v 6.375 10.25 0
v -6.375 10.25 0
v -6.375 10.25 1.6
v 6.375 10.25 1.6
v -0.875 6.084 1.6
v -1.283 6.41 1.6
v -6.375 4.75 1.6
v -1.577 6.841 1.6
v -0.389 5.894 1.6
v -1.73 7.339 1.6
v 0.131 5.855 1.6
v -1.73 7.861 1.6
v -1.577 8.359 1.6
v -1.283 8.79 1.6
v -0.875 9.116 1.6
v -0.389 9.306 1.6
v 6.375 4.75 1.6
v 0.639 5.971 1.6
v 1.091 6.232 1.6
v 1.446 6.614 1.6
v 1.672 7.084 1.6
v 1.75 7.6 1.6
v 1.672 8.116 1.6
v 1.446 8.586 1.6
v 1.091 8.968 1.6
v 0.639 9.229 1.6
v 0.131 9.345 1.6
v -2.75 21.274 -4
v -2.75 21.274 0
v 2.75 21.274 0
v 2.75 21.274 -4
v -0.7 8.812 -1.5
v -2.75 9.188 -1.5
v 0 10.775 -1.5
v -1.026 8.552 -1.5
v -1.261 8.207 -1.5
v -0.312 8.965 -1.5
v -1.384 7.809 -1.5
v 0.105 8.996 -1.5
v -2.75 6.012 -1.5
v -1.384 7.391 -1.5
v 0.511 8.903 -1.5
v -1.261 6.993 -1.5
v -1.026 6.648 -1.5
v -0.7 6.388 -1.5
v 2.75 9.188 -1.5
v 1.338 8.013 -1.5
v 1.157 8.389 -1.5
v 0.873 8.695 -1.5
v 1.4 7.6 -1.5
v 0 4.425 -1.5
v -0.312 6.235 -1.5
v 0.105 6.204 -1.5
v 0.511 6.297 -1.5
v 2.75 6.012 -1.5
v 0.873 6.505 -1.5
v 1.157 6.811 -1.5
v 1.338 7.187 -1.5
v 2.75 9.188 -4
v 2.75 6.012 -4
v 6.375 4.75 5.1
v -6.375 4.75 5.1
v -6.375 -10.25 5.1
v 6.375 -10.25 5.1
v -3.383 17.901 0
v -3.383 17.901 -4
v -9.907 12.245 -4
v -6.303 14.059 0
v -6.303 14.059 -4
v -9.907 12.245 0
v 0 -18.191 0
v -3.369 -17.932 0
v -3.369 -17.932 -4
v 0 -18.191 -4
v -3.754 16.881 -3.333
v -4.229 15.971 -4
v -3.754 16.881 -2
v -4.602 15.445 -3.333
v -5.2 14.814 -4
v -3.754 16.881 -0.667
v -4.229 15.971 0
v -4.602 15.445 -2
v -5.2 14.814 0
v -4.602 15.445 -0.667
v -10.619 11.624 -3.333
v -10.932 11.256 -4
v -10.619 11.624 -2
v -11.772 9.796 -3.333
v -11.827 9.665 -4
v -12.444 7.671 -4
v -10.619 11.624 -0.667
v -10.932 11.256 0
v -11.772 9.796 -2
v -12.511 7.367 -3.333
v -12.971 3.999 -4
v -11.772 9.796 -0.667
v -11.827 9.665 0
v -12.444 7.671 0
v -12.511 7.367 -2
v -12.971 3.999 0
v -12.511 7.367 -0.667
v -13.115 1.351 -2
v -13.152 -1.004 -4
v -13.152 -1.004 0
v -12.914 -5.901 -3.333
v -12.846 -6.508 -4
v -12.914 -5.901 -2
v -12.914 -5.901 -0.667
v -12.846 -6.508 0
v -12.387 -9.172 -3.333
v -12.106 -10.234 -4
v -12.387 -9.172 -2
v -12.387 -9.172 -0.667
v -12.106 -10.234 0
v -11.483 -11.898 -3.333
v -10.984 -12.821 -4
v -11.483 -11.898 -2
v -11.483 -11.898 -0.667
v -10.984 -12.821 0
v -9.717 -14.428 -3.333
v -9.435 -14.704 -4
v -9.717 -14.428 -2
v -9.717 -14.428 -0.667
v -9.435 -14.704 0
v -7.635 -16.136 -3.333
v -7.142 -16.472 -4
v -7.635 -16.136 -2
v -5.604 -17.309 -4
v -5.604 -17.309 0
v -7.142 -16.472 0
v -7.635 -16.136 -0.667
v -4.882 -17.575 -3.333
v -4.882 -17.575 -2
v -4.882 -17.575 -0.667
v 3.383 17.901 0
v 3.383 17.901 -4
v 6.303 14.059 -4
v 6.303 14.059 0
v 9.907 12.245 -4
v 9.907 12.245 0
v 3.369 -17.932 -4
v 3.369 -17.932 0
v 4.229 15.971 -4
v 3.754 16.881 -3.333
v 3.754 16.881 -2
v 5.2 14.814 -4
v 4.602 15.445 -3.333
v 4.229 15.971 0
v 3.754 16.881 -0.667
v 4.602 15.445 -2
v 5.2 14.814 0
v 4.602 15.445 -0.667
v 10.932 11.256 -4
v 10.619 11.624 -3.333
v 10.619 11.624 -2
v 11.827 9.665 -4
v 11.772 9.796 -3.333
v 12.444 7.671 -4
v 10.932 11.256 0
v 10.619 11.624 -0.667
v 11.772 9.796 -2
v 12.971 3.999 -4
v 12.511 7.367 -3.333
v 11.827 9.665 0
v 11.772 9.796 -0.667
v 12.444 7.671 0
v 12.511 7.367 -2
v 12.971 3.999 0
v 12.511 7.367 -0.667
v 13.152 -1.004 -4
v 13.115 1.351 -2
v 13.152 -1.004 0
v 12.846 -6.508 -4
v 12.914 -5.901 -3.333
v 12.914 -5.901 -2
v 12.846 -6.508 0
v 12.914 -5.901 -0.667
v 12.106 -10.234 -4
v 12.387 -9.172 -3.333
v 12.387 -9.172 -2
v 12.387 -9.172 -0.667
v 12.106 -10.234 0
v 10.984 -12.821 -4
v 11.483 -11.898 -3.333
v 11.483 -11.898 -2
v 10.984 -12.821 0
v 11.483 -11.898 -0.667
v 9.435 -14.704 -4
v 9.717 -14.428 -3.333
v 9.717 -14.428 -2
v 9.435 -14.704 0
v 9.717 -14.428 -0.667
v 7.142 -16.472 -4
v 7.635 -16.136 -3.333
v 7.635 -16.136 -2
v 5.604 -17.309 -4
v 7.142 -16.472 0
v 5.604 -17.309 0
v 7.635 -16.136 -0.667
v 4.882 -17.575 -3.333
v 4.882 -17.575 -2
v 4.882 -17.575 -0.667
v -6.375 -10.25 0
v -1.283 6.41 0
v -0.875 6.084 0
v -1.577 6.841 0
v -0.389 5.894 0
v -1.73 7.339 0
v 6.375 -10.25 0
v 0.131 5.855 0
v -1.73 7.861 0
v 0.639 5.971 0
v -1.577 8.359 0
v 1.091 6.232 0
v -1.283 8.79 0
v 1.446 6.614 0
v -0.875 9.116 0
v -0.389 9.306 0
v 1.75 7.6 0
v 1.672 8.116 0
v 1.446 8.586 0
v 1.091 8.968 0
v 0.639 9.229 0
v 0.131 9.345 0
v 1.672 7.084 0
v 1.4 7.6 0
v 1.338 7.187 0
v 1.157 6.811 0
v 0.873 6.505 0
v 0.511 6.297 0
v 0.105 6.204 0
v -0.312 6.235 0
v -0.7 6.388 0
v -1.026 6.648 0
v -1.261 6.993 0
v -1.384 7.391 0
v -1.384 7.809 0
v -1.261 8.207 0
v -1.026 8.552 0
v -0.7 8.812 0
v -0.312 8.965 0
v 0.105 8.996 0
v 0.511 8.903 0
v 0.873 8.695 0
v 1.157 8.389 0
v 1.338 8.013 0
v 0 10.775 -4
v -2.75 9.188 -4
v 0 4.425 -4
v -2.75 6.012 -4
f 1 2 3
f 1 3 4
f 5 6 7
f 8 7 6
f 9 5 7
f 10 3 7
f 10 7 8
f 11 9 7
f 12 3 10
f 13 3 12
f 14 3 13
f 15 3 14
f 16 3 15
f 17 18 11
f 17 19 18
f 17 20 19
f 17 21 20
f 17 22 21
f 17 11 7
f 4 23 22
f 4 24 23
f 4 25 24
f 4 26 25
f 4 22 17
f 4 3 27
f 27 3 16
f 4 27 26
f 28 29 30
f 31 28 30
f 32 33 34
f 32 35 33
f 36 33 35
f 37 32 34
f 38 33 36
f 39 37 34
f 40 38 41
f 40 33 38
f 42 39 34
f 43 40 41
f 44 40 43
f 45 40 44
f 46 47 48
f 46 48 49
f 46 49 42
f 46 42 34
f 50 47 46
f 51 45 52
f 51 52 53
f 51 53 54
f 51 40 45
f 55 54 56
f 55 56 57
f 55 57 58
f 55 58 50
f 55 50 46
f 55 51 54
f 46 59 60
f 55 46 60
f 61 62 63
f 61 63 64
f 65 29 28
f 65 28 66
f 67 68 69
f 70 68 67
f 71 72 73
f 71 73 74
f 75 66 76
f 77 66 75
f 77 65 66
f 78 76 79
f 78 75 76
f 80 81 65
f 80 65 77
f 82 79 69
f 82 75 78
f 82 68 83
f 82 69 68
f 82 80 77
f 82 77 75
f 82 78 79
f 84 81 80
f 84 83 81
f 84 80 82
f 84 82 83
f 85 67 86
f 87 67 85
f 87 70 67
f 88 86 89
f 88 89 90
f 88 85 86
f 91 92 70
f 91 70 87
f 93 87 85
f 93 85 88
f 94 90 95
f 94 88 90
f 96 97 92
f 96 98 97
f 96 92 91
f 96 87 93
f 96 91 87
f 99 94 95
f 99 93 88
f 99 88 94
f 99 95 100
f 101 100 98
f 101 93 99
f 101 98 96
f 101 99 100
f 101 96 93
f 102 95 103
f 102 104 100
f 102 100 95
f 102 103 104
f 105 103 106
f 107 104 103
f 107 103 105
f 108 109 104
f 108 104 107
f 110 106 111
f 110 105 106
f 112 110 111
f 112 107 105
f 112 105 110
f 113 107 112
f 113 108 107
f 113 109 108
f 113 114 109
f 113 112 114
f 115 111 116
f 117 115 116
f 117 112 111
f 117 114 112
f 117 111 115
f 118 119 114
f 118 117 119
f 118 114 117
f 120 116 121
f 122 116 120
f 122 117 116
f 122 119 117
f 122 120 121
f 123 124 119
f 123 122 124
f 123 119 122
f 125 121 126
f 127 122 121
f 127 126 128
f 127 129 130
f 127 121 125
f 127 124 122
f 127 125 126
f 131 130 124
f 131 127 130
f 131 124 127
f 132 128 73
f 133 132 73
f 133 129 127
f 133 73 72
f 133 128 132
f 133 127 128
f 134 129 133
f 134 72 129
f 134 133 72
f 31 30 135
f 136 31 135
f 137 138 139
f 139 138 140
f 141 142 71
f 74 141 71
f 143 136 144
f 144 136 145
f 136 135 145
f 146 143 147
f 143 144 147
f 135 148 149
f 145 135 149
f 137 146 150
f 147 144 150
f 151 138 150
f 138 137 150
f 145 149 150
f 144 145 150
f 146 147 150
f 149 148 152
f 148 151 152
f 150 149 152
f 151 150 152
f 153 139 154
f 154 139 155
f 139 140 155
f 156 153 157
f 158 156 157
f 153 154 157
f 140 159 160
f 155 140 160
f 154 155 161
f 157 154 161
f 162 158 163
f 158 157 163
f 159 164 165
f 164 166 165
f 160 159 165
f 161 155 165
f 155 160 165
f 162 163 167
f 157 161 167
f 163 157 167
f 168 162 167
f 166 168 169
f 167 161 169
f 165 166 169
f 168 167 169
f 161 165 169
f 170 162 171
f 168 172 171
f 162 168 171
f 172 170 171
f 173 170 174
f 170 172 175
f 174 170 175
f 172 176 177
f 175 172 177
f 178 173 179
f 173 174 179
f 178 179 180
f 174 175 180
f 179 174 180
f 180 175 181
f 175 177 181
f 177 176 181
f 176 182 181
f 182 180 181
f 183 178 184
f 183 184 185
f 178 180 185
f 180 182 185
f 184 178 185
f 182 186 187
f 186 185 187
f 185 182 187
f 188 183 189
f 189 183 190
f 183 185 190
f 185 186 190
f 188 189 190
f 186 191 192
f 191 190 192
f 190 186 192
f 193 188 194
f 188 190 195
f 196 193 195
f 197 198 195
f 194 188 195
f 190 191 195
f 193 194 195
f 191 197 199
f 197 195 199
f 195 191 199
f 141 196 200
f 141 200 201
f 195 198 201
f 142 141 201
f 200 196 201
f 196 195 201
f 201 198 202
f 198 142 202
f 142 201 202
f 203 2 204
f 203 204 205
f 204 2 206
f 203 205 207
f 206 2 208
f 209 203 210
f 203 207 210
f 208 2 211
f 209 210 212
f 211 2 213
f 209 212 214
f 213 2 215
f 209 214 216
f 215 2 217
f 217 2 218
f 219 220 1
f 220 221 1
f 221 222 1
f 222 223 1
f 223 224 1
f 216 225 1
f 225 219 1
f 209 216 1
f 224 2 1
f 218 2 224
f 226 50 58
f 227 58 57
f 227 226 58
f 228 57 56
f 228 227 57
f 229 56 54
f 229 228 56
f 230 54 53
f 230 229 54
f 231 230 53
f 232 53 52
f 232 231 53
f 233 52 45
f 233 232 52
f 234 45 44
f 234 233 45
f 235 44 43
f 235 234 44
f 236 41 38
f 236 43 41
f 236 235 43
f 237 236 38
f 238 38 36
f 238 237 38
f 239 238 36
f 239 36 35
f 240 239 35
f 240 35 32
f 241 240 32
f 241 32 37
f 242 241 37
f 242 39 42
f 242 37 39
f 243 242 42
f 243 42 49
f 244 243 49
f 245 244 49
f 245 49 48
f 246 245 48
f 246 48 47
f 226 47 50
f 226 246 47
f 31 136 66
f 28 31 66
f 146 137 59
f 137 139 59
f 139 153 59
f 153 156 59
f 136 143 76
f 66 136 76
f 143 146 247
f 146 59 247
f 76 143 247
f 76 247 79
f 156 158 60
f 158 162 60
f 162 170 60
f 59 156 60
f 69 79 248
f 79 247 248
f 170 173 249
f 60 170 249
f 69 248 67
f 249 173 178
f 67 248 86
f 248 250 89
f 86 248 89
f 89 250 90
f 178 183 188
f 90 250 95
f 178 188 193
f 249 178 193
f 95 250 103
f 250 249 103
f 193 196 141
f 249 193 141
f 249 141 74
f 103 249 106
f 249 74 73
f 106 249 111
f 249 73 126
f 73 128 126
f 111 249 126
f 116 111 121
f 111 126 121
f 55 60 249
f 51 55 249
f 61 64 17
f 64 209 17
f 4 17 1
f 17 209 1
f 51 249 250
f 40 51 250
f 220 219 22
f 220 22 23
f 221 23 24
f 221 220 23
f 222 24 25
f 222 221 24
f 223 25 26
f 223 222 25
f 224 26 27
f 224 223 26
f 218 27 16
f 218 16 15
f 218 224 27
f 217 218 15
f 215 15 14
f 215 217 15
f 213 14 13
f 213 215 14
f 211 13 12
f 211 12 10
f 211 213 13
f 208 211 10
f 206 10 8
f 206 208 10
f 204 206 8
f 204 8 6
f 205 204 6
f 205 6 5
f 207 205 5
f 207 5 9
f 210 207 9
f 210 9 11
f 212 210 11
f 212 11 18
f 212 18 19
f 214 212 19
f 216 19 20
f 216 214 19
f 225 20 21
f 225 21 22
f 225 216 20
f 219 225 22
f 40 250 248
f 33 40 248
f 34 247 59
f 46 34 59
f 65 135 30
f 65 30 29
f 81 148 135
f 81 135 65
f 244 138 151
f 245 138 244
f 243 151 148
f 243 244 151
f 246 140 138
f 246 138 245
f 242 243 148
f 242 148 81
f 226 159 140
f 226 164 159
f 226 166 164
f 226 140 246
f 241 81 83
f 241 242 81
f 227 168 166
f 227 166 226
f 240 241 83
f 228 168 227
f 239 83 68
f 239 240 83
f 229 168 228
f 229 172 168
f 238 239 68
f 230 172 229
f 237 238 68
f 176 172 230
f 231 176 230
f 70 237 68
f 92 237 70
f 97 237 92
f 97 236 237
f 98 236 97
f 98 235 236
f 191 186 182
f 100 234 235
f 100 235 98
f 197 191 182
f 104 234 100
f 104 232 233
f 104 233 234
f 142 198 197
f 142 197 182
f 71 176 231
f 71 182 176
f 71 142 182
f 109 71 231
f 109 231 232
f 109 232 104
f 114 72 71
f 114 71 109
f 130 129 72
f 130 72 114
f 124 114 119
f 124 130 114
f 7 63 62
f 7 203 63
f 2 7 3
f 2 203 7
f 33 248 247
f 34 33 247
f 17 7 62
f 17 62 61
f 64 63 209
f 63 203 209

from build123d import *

# Parameters (mm, degrees)
F0_W     = 12.75
F0_H     = 20.5
F0_R     = 1.75
F1_DEPTH = 1.6
F2_R     = 1.4
F3_DEPTH = 4
F5_DEPTH = 2.5
F6_W     = 12.75
F6_H     = 15
F7_DEPTH = 3.5


with BuildPart() as f1:
    # F0 (on Top) → F1 (new body)
    with BuildSketch(Plane.XY):
        Rectangle(F0_W, F0_H)
        with Locations((0, 7.6)):
            Circle(F0_R, mode=Mode.SUBTRACT)
    extrude(amount=F1_DEPTH)

    # F6 (on face) → F7 (join)
    with BuildSketch(Plane.XY.offset(1.6)):
        with Locations((0, -2.75)):
            Rectangle(F6_W, F6_H)
    extrude(amount=F7_DEPTH)


with BuildPart() as f3:
    # F2 (on face) → F3 (new body)
    with BuildSketch(Plane(origin=(0, 0, 0), x_dir=(1, 0, 0), z_dir=(0, 0, -1))):
        with BuildLine():
            add(Edge.make_bspline(
                [(-2.75, -21.274395287), (-3.1538479416, -17.5647359662), (-4.7954433454, -13.8168100471), (-12.1081629081, -12.5765102153), (-13.5397026844, -1.1694834905), (-12.7708206971, 12.159775653), (-7.2886974081, 16.5538616792), (-4.4771958107, 18.1403989938), (0, 18.1906595826)],
                knots=[0, 0, 0, 0, 0.1588602561, 0.296699506, 0.4855380164, 0.6977378064, 0.8366915404, 1, 1, 1, 1], degree=3))
            Line((-2.75, -21.274395287), (2.75, -21.274395287))
            add(Edge.make_bspline(
                [(2.75, -21.274395287), (3.1538479416, -17.5647359662), (4.7954433454, -13.8168100471), (12.1081629081, -12.5765102153), (13.5397026844, -1.1694834905), (12.7708206971, 12.159775653), (7.2886974081, 16.5538616792), (4.4771958107, 18.1403989938), (0, 18.1906595826)],
                knots=[0, 0, 0, 0, 0.1588602561, 0.296699506, 0.4855380164, 0.6977378064, 0.8366915404, 1, 1, 1, 1], degree=3))
        make_face()
        with Locations((0, -7.6)):
            Circle(F2_R, mode=Mode.SUBTRACT)
    extrude(amount=F3_DEPTH)

    # F4 (on face) → F5 (cut)
    with BuildSketch(Plane(origin=(0, 0, -4), x_dir=(1, 0, 0), z_dir=(0, 0, -1))):
        Polygon((2.75, -9.1877132403), (2.75, -6.0122867597), (0, -4.4245735195), (-2.75, -6.0122867597), (-2.75, -9.1877132403), (0, -10.7754264805), align=None)
    extrude(amount=-F5_DEPTH, mode=Mode.SUBTRACT)


solid = Compound([f1.part, f3.part])
